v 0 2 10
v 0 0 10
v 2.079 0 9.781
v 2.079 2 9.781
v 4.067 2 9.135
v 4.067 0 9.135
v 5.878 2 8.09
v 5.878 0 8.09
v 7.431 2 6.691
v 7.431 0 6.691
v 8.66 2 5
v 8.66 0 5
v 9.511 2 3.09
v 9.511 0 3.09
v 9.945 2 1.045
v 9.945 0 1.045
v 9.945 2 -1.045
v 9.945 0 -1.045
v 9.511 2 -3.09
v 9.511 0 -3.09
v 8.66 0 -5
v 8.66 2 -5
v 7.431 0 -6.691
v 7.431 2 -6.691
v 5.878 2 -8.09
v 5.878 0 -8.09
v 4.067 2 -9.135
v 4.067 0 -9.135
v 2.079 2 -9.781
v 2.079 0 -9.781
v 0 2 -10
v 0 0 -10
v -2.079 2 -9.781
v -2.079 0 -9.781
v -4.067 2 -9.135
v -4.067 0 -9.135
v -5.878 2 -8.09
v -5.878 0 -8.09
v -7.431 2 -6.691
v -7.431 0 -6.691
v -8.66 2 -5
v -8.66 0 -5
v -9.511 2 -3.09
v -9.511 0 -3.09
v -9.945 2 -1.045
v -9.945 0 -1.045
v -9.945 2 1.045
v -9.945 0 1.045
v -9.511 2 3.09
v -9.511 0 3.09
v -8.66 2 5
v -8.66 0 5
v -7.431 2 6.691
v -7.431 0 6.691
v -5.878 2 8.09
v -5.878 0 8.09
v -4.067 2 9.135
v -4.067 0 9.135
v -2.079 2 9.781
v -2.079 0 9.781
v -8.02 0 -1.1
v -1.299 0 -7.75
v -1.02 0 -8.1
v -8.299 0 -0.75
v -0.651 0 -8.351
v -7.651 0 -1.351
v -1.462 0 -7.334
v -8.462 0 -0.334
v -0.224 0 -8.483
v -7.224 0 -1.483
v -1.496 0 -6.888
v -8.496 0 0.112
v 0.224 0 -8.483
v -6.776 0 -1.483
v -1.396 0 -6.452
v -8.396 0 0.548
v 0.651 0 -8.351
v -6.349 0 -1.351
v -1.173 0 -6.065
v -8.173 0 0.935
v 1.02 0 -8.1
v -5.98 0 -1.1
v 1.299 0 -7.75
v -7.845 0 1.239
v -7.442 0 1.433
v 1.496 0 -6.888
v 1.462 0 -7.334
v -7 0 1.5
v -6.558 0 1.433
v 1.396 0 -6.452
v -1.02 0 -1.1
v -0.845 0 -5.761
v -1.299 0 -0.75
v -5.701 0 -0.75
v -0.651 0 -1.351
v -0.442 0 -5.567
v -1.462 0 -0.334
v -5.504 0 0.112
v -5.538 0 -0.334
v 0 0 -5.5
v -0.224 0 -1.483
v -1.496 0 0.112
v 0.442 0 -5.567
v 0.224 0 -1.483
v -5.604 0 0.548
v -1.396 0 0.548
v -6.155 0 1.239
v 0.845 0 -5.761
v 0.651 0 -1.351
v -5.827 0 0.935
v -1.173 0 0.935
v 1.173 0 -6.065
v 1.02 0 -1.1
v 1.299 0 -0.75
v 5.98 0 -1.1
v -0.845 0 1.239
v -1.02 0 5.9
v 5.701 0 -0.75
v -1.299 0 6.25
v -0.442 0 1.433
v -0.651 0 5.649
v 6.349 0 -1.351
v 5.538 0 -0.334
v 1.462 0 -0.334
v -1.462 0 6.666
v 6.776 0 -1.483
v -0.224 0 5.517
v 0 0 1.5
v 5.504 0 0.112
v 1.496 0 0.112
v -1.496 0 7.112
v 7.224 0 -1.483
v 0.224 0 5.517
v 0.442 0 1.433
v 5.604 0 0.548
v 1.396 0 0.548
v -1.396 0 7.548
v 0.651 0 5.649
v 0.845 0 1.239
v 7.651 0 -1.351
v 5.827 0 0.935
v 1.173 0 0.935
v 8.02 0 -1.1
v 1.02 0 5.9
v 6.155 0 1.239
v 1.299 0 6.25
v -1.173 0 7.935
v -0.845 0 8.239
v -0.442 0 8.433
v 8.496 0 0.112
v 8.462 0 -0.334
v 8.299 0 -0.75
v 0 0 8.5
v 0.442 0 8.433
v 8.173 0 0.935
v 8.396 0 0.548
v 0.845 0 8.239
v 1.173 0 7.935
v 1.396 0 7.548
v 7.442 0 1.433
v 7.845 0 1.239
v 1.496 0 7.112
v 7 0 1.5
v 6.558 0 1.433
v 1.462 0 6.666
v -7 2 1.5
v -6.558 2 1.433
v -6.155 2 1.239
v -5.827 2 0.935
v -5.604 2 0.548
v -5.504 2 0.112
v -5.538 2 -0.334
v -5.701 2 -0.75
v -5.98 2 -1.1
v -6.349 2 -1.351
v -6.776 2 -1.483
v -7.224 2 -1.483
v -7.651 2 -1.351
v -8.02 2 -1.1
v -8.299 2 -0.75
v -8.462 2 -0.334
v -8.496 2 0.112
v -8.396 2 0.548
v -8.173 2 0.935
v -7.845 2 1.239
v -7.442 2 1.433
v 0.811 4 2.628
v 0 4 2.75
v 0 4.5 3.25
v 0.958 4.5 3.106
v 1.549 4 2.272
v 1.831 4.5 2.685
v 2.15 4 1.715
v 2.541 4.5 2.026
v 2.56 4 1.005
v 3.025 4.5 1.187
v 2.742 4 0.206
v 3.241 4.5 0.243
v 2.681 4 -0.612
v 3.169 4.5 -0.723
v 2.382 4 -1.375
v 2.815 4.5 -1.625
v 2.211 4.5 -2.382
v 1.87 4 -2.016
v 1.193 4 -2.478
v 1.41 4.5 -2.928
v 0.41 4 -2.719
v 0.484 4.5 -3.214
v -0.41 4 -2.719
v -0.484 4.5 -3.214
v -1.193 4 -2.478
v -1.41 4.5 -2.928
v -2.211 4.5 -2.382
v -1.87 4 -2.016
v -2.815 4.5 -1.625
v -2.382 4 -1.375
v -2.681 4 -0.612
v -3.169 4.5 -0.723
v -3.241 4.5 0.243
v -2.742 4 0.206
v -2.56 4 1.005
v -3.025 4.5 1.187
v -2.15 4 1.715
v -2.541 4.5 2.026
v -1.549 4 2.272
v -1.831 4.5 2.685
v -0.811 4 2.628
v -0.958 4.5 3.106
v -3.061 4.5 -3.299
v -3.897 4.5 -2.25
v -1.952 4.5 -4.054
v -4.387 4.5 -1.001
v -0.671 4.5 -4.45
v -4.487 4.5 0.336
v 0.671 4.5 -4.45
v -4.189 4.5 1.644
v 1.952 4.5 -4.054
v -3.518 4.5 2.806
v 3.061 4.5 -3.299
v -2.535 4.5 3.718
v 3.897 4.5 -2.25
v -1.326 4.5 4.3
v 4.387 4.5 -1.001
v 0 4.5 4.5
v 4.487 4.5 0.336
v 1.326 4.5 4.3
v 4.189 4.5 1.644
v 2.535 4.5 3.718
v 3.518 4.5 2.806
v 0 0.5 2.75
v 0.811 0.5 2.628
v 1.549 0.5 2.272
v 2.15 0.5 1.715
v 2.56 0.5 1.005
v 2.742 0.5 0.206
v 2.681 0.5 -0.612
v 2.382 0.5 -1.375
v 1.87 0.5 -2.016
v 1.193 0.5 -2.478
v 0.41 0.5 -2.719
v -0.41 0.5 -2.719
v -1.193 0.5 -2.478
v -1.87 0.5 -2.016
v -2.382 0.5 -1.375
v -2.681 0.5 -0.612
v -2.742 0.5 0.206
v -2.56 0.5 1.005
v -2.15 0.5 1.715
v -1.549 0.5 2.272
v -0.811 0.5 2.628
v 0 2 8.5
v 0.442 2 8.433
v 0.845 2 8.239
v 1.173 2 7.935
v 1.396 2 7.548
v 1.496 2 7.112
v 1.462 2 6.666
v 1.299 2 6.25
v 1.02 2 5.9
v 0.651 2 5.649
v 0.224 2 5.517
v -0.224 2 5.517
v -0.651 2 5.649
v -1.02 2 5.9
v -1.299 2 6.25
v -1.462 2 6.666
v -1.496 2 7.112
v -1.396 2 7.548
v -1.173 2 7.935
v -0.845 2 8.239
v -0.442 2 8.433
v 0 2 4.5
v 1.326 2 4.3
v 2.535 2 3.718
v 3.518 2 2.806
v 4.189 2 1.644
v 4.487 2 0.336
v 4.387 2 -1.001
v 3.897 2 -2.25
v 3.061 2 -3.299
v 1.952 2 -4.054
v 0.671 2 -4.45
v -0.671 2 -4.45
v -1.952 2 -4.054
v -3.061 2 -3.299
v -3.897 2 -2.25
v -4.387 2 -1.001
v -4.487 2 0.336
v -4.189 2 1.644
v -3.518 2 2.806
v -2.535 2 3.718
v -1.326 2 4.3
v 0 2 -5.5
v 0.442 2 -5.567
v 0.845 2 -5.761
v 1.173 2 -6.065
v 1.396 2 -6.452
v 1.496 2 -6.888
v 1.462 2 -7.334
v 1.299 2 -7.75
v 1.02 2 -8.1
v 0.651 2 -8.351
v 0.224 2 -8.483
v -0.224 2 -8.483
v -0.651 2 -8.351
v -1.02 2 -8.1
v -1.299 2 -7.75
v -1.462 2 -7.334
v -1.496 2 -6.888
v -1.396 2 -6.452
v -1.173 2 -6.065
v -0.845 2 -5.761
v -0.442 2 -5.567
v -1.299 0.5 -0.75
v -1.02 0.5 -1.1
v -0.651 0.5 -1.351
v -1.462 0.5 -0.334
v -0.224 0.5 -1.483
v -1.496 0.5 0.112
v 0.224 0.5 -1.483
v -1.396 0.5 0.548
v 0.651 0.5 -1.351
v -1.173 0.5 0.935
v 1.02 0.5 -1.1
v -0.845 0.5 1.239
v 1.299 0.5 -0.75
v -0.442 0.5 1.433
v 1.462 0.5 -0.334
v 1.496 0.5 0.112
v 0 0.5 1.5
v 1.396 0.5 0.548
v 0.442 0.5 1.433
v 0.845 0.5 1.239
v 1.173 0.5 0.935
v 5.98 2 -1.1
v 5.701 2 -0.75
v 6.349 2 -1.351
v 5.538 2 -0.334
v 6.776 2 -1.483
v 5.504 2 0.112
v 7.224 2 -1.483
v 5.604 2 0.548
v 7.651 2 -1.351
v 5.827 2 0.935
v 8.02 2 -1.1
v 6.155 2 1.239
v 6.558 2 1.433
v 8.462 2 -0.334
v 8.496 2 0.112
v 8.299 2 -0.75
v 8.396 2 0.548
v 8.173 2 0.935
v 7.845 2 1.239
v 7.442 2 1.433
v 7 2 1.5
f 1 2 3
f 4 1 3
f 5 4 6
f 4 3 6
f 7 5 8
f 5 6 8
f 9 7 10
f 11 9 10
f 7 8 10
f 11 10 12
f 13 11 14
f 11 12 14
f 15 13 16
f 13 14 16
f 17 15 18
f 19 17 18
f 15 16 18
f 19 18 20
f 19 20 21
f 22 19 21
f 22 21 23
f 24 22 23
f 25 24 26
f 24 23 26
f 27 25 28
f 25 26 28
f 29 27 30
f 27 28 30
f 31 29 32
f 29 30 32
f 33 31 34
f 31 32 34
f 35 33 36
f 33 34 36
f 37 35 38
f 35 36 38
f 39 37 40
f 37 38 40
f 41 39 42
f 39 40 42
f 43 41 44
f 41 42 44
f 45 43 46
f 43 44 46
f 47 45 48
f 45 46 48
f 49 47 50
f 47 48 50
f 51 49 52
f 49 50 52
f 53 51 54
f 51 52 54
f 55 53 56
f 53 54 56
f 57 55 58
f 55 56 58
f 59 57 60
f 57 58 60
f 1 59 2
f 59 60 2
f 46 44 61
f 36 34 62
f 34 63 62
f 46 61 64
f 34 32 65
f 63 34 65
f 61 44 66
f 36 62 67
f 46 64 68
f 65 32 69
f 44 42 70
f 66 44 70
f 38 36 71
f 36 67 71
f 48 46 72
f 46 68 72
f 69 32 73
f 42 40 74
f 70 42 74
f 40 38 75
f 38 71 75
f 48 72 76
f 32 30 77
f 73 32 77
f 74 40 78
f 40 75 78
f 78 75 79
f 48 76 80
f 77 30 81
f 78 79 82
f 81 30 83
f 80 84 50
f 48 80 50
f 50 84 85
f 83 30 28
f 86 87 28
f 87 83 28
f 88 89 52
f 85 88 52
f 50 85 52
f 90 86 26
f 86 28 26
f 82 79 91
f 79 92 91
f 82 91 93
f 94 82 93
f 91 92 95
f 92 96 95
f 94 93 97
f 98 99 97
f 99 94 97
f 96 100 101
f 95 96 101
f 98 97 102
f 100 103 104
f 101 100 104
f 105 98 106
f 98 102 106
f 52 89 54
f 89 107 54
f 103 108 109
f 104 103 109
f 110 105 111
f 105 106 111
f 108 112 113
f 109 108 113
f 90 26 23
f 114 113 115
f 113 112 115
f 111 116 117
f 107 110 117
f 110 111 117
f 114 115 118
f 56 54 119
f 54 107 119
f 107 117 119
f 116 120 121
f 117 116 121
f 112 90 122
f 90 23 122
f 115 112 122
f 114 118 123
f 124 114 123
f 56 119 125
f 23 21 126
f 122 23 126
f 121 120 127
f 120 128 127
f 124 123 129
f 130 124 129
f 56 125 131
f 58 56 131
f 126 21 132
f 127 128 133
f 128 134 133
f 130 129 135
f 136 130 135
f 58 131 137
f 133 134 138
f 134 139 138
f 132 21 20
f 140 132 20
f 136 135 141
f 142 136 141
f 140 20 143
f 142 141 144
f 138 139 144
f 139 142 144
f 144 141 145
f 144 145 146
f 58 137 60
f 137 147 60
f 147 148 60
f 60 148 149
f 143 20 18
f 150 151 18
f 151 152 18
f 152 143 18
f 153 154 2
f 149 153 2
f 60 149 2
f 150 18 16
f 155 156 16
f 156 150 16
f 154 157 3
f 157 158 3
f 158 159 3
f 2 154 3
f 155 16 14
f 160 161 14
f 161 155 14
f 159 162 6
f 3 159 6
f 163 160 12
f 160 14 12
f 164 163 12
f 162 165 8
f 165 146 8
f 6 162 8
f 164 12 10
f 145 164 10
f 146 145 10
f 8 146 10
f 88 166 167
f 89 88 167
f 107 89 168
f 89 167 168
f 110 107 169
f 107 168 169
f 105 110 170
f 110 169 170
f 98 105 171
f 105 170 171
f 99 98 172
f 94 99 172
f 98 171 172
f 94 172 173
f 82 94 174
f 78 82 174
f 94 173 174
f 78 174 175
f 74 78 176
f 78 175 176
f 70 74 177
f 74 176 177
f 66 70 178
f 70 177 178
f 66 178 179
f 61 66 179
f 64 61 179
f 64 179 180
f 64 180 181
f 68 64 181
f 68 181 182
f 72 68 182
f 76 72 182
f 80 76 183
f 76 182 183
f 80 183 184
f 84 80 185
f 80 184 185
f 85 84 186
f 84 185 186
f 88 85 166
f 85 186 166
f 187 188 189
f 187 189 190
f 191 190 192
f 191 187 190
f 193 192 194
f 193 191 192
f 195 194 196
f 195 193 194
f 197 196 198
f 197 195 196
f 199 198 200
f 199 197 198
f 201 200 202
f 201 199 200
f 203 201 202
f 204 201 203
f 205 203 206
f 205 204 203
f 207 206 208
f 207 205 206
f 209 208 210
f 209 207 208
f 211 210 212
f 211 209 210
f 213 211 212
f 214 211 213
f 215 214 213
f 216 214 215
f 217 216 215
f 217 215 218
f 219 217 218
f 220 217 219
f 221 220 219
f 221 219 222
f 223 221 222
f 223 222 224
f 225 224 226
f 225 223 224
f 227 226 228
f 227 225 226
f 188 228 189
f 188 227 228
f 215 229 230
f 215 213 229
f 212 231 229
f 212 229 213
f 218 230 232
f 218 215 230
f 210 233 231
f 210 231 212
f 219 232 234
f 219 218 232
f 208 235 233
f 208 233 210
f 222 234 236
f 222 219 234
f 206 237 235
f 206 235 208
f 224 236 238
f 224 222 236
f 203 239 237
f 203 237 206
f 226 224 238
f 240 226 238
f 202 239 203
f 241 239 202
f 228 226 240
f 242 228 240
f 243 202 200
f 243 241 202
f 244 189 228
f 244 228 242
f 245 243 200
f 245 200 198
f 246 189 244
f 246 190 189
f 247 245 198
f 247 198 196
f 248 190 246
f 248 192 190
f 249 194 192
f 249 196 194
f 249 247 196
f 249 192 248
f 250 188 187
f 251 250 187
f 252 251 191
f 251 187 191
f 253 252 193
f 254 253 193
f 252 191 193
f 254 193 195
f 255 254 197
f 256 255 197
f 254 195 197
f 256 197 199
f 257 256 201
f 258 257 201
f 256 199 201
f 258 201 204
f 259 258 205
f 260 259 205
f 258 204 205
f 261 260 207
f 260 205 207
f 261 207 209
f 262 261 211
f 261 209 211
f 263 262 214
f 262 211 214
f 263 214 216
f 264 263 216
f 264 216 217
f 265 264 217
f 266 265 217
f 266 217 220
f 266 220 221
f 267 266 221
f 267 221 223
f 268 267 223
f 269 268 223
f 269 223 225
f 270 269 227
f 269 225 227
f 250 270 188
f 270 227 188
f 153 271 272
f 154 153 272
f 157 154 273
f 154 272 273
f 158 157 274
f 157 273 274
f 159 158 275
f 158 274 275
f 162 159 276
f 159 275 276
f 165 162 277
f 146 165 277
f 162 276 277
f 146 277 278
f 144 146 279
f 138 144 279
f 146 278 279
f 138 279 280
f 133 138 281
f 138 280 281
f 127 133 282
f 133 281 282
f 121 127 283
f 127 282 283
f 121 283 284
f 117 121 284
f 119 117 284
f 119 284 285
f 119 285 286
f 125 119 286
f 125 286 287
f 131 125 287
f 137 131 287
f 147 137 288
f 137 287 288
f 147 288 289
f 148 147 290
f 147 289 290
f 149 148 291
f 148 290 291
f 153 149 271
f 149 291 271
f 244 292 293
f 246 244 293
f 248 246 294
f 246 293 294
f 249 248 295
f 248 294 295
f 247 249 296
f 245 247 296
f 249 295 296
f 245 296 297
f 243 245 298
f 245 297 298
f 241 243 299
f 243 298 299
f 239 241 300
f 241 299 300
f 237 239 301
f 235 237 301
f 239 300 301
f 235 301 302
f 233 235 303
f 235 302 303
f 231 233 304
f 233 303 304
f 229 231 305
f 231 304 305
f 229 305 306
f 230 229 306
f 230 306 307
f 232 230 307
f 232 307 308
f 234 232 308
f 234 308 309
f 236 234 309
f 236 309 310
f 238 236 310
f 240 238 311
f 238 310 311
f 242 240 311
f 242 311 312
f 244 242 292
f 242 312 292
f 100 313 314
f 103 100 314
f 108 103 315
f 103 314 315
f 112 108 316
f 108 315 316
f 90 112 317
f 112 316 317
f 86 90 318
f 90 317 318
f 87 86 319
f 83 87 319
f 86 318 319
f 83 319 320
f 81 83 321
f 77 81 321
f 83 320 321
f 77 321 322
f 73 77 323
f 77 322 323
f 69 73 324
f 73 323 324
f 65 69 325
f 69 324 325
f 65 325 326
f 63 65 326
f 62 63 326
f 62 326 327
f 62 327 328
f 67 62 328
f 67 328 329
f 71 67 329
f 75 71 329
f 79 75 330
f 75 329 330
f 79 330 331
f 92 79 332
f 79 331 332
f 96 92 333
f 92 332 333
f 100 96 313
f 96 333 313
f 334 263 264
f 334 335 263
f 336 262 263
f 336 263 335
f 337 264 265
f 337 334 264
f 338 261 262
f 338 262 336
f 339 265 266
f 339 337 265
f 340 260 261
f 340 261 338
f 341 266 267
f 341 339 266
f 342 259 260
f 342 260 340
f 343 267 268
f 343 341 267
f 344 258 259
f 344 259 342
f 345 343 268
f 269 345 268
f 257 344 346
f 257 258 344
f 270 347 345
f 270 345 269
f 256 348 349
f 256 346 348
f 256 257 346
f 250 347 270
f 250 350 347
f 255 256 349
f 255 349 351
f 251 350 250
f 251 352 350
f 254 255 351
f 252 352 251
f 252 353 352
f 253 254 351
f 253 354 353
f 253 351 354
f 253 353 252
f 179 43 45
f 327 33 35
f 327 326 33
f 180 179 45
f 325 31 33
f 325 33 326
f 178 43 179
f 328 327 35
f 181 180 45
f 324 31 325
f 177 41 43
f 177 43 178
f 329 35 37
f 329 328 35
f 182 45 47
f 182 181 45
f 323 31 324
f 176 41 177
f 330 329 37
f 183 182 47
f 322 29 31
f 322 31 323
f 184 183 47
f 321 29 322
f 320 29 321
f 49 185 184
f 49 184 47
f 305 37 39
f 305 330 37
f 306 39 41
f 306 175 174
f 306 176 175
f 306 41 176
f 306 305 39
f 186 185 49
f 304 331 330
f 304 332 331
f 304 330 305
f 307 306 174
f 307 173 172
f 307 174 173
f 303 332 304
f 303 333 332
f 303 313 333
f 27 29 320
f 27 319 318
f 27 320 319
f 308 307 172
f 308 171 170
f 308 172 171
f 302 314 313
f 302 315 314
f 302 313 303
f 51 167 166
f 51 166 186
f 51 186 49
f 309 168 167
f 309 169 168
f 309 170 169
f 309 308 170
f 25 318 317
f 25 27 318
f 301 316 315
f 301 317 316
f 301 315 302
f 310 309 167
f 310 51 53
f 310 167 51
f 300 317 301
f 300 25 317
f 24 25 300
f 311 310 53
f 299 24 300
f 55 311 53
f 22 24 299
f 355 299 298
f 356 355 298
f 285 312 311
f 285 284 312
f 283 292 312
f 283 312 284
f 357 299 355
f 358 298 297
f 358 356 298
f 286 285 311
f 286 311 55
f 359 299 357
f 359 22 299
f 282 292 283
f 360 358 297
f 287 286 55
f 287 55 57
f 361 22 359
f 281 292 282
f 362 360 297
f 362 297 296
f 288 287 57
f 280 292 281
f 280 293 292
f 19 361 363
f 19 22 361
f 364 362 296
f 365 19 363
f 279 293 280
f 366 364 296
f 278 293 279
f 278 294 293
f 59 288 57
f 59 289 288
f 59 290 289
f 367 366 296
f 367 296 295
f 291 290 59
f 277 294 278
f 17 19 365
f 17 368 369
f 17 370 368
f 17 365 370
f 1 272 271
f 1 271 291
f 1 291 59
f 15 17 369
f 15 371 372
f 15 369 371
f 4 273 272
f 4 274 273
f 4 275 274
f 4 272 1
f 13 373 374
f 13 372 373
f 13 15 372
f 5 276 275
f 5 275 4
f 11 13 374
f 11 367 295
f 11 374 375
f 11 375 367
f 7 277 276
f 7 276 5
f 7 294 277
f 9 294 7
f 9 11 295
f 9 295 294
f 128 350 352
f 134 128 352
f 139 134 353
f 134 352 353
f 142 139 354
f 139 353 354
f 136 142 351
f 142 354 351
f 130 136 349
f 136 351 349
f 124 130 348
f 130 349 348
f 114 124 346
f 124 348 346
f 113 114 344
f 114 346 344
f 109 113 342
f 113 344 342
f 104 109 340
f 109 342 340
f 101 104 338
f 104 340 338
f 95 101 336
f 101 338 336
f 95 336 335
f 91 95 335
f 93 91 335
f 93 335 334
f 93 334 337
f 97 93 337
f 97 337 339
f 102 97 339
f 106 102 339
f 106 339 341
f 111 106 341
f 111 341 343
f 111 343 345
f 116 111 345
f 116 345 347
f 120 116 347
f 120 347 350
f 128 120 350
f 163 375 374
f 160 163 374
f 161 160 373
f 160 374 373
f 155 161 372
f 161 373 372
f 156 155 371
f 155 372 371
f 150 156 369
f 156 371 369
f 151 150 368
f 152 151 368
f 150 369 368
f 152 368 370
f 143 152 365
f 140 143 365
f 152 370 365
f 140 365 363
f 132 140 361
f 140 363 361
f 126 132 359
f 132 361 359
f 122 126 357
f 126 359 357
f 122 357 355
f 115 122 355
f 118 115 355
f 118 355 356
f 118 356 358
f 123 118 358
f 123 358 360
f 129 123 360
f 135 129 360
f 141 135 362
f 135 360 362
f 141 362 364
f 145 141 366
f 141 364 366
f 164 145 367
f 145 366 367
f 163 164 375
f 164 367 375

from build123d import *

# Parameters (mm, degrees)
SKETCH_1_R          = 10
EXTRUDE_1_DEPTH     = 2
SKETCH_2_R          = 1.5
CUT_EXTRUDE_1_DEPTH = 2
SKETCH_3_R          = 4.5
EXTRUDE_2_DEPTH     = 2.5
SKETCH_4_R          = 2.75
CUT_EXTRUDE_2_DEPTH = 4
SKETCH_5_R          = 1.5
CUT_EXTRUDE_3_DEPTH = 4
CHAMFER_1_SIZE      = 0.5


with BuildPart() as part:
    # 草图1 → 凸台-拉伸1 (new body)
    with BuildSketch(Plane(origin=(0, 0, 0), x_dir=(1, 0, 0), z_dir=(0, 1, 0))):
        with Locations(Location((0, 0, 0), (0, 0, 270))):
            Circle(SKETCH_1_R)
    extrude(amount=EXTRUDE_1_DEPTH)

    # 草图2 → 切除-拉伸1 (cut)
    with BuildSketch(Plane(origin=(0, 2, 0), x_dir=(1, 0, 0), z_dir=(0, 1, 0))):
        with Locations(Location((-7, 0, 0), (0, 0, 270))):
            Circle(SKETCH_2_R)
        with Locations(Location((0, 7, 0), (0, 0, 270))):
            Circle(SKETCH_2_R)
        with Locations(Location((7, 0, 0), (0, 0, 270))):
            Circle(SKETCH_2_R)
        with Locations(Location((0, -7, 0), (0, 0, 270))):
            Circle(SKETCH_2_R)
    extrude(amount=-CUT_EXTRUDE_1_DEPTH, mode=Mode.SUBTRACT)

    # 草图3 → 凸台-拉伸2 (add)
    with BuildSketch(Plane(origin=(0, 2, 0), x_dir=(1, 0, 0), z_dir=(0, 1, 0))):
        with Locations(Location((0, 0, 0), (0, 0, 270))):
            Circle(SKETCH_3_R)
    extrude(amount=EXTRUDE_2_DEPTH)

    # 草图4 → 切除-拉伸2 (cut)
    with BuildSketch(Plane(origin=(0, 4.5, 0), x_dir=(1, 0, 0), z_dir=(0, 1, 0))):
        with Locations(Location((0, 0, 0), (0, 0, 270))):
            Circle(SKETCH_4_R)
    extrude(amount=-CUT_EXTRUDE_2_DEPTH, mode=Mode.SUBTRACT)

    # 草图5 → 切除-拉伸3 (cut)
    with BuildSketch(Plane(origin=(0, 0.5, 0), x_dir=(1, 0, 0), z_dir=(0, 1, 0))):
        with Locations(Location((0, 0, 0), (0, 0, 270))):
            Circle(SKETCH_5_R)
    extrude(amount=-CUT_EXTRUDE_3_DEPTH, mode=Mode.SUBTRACT)

    # 倒角1
    chamfer_1_edges = [part.edges().sort_by_distance(p)[0] for p in [
        (0, 4.5, -2.75),
    ]]
    chamfer(chamfer_1_edges, length=CHAMFER_1_SIZE)


solid = part.part
